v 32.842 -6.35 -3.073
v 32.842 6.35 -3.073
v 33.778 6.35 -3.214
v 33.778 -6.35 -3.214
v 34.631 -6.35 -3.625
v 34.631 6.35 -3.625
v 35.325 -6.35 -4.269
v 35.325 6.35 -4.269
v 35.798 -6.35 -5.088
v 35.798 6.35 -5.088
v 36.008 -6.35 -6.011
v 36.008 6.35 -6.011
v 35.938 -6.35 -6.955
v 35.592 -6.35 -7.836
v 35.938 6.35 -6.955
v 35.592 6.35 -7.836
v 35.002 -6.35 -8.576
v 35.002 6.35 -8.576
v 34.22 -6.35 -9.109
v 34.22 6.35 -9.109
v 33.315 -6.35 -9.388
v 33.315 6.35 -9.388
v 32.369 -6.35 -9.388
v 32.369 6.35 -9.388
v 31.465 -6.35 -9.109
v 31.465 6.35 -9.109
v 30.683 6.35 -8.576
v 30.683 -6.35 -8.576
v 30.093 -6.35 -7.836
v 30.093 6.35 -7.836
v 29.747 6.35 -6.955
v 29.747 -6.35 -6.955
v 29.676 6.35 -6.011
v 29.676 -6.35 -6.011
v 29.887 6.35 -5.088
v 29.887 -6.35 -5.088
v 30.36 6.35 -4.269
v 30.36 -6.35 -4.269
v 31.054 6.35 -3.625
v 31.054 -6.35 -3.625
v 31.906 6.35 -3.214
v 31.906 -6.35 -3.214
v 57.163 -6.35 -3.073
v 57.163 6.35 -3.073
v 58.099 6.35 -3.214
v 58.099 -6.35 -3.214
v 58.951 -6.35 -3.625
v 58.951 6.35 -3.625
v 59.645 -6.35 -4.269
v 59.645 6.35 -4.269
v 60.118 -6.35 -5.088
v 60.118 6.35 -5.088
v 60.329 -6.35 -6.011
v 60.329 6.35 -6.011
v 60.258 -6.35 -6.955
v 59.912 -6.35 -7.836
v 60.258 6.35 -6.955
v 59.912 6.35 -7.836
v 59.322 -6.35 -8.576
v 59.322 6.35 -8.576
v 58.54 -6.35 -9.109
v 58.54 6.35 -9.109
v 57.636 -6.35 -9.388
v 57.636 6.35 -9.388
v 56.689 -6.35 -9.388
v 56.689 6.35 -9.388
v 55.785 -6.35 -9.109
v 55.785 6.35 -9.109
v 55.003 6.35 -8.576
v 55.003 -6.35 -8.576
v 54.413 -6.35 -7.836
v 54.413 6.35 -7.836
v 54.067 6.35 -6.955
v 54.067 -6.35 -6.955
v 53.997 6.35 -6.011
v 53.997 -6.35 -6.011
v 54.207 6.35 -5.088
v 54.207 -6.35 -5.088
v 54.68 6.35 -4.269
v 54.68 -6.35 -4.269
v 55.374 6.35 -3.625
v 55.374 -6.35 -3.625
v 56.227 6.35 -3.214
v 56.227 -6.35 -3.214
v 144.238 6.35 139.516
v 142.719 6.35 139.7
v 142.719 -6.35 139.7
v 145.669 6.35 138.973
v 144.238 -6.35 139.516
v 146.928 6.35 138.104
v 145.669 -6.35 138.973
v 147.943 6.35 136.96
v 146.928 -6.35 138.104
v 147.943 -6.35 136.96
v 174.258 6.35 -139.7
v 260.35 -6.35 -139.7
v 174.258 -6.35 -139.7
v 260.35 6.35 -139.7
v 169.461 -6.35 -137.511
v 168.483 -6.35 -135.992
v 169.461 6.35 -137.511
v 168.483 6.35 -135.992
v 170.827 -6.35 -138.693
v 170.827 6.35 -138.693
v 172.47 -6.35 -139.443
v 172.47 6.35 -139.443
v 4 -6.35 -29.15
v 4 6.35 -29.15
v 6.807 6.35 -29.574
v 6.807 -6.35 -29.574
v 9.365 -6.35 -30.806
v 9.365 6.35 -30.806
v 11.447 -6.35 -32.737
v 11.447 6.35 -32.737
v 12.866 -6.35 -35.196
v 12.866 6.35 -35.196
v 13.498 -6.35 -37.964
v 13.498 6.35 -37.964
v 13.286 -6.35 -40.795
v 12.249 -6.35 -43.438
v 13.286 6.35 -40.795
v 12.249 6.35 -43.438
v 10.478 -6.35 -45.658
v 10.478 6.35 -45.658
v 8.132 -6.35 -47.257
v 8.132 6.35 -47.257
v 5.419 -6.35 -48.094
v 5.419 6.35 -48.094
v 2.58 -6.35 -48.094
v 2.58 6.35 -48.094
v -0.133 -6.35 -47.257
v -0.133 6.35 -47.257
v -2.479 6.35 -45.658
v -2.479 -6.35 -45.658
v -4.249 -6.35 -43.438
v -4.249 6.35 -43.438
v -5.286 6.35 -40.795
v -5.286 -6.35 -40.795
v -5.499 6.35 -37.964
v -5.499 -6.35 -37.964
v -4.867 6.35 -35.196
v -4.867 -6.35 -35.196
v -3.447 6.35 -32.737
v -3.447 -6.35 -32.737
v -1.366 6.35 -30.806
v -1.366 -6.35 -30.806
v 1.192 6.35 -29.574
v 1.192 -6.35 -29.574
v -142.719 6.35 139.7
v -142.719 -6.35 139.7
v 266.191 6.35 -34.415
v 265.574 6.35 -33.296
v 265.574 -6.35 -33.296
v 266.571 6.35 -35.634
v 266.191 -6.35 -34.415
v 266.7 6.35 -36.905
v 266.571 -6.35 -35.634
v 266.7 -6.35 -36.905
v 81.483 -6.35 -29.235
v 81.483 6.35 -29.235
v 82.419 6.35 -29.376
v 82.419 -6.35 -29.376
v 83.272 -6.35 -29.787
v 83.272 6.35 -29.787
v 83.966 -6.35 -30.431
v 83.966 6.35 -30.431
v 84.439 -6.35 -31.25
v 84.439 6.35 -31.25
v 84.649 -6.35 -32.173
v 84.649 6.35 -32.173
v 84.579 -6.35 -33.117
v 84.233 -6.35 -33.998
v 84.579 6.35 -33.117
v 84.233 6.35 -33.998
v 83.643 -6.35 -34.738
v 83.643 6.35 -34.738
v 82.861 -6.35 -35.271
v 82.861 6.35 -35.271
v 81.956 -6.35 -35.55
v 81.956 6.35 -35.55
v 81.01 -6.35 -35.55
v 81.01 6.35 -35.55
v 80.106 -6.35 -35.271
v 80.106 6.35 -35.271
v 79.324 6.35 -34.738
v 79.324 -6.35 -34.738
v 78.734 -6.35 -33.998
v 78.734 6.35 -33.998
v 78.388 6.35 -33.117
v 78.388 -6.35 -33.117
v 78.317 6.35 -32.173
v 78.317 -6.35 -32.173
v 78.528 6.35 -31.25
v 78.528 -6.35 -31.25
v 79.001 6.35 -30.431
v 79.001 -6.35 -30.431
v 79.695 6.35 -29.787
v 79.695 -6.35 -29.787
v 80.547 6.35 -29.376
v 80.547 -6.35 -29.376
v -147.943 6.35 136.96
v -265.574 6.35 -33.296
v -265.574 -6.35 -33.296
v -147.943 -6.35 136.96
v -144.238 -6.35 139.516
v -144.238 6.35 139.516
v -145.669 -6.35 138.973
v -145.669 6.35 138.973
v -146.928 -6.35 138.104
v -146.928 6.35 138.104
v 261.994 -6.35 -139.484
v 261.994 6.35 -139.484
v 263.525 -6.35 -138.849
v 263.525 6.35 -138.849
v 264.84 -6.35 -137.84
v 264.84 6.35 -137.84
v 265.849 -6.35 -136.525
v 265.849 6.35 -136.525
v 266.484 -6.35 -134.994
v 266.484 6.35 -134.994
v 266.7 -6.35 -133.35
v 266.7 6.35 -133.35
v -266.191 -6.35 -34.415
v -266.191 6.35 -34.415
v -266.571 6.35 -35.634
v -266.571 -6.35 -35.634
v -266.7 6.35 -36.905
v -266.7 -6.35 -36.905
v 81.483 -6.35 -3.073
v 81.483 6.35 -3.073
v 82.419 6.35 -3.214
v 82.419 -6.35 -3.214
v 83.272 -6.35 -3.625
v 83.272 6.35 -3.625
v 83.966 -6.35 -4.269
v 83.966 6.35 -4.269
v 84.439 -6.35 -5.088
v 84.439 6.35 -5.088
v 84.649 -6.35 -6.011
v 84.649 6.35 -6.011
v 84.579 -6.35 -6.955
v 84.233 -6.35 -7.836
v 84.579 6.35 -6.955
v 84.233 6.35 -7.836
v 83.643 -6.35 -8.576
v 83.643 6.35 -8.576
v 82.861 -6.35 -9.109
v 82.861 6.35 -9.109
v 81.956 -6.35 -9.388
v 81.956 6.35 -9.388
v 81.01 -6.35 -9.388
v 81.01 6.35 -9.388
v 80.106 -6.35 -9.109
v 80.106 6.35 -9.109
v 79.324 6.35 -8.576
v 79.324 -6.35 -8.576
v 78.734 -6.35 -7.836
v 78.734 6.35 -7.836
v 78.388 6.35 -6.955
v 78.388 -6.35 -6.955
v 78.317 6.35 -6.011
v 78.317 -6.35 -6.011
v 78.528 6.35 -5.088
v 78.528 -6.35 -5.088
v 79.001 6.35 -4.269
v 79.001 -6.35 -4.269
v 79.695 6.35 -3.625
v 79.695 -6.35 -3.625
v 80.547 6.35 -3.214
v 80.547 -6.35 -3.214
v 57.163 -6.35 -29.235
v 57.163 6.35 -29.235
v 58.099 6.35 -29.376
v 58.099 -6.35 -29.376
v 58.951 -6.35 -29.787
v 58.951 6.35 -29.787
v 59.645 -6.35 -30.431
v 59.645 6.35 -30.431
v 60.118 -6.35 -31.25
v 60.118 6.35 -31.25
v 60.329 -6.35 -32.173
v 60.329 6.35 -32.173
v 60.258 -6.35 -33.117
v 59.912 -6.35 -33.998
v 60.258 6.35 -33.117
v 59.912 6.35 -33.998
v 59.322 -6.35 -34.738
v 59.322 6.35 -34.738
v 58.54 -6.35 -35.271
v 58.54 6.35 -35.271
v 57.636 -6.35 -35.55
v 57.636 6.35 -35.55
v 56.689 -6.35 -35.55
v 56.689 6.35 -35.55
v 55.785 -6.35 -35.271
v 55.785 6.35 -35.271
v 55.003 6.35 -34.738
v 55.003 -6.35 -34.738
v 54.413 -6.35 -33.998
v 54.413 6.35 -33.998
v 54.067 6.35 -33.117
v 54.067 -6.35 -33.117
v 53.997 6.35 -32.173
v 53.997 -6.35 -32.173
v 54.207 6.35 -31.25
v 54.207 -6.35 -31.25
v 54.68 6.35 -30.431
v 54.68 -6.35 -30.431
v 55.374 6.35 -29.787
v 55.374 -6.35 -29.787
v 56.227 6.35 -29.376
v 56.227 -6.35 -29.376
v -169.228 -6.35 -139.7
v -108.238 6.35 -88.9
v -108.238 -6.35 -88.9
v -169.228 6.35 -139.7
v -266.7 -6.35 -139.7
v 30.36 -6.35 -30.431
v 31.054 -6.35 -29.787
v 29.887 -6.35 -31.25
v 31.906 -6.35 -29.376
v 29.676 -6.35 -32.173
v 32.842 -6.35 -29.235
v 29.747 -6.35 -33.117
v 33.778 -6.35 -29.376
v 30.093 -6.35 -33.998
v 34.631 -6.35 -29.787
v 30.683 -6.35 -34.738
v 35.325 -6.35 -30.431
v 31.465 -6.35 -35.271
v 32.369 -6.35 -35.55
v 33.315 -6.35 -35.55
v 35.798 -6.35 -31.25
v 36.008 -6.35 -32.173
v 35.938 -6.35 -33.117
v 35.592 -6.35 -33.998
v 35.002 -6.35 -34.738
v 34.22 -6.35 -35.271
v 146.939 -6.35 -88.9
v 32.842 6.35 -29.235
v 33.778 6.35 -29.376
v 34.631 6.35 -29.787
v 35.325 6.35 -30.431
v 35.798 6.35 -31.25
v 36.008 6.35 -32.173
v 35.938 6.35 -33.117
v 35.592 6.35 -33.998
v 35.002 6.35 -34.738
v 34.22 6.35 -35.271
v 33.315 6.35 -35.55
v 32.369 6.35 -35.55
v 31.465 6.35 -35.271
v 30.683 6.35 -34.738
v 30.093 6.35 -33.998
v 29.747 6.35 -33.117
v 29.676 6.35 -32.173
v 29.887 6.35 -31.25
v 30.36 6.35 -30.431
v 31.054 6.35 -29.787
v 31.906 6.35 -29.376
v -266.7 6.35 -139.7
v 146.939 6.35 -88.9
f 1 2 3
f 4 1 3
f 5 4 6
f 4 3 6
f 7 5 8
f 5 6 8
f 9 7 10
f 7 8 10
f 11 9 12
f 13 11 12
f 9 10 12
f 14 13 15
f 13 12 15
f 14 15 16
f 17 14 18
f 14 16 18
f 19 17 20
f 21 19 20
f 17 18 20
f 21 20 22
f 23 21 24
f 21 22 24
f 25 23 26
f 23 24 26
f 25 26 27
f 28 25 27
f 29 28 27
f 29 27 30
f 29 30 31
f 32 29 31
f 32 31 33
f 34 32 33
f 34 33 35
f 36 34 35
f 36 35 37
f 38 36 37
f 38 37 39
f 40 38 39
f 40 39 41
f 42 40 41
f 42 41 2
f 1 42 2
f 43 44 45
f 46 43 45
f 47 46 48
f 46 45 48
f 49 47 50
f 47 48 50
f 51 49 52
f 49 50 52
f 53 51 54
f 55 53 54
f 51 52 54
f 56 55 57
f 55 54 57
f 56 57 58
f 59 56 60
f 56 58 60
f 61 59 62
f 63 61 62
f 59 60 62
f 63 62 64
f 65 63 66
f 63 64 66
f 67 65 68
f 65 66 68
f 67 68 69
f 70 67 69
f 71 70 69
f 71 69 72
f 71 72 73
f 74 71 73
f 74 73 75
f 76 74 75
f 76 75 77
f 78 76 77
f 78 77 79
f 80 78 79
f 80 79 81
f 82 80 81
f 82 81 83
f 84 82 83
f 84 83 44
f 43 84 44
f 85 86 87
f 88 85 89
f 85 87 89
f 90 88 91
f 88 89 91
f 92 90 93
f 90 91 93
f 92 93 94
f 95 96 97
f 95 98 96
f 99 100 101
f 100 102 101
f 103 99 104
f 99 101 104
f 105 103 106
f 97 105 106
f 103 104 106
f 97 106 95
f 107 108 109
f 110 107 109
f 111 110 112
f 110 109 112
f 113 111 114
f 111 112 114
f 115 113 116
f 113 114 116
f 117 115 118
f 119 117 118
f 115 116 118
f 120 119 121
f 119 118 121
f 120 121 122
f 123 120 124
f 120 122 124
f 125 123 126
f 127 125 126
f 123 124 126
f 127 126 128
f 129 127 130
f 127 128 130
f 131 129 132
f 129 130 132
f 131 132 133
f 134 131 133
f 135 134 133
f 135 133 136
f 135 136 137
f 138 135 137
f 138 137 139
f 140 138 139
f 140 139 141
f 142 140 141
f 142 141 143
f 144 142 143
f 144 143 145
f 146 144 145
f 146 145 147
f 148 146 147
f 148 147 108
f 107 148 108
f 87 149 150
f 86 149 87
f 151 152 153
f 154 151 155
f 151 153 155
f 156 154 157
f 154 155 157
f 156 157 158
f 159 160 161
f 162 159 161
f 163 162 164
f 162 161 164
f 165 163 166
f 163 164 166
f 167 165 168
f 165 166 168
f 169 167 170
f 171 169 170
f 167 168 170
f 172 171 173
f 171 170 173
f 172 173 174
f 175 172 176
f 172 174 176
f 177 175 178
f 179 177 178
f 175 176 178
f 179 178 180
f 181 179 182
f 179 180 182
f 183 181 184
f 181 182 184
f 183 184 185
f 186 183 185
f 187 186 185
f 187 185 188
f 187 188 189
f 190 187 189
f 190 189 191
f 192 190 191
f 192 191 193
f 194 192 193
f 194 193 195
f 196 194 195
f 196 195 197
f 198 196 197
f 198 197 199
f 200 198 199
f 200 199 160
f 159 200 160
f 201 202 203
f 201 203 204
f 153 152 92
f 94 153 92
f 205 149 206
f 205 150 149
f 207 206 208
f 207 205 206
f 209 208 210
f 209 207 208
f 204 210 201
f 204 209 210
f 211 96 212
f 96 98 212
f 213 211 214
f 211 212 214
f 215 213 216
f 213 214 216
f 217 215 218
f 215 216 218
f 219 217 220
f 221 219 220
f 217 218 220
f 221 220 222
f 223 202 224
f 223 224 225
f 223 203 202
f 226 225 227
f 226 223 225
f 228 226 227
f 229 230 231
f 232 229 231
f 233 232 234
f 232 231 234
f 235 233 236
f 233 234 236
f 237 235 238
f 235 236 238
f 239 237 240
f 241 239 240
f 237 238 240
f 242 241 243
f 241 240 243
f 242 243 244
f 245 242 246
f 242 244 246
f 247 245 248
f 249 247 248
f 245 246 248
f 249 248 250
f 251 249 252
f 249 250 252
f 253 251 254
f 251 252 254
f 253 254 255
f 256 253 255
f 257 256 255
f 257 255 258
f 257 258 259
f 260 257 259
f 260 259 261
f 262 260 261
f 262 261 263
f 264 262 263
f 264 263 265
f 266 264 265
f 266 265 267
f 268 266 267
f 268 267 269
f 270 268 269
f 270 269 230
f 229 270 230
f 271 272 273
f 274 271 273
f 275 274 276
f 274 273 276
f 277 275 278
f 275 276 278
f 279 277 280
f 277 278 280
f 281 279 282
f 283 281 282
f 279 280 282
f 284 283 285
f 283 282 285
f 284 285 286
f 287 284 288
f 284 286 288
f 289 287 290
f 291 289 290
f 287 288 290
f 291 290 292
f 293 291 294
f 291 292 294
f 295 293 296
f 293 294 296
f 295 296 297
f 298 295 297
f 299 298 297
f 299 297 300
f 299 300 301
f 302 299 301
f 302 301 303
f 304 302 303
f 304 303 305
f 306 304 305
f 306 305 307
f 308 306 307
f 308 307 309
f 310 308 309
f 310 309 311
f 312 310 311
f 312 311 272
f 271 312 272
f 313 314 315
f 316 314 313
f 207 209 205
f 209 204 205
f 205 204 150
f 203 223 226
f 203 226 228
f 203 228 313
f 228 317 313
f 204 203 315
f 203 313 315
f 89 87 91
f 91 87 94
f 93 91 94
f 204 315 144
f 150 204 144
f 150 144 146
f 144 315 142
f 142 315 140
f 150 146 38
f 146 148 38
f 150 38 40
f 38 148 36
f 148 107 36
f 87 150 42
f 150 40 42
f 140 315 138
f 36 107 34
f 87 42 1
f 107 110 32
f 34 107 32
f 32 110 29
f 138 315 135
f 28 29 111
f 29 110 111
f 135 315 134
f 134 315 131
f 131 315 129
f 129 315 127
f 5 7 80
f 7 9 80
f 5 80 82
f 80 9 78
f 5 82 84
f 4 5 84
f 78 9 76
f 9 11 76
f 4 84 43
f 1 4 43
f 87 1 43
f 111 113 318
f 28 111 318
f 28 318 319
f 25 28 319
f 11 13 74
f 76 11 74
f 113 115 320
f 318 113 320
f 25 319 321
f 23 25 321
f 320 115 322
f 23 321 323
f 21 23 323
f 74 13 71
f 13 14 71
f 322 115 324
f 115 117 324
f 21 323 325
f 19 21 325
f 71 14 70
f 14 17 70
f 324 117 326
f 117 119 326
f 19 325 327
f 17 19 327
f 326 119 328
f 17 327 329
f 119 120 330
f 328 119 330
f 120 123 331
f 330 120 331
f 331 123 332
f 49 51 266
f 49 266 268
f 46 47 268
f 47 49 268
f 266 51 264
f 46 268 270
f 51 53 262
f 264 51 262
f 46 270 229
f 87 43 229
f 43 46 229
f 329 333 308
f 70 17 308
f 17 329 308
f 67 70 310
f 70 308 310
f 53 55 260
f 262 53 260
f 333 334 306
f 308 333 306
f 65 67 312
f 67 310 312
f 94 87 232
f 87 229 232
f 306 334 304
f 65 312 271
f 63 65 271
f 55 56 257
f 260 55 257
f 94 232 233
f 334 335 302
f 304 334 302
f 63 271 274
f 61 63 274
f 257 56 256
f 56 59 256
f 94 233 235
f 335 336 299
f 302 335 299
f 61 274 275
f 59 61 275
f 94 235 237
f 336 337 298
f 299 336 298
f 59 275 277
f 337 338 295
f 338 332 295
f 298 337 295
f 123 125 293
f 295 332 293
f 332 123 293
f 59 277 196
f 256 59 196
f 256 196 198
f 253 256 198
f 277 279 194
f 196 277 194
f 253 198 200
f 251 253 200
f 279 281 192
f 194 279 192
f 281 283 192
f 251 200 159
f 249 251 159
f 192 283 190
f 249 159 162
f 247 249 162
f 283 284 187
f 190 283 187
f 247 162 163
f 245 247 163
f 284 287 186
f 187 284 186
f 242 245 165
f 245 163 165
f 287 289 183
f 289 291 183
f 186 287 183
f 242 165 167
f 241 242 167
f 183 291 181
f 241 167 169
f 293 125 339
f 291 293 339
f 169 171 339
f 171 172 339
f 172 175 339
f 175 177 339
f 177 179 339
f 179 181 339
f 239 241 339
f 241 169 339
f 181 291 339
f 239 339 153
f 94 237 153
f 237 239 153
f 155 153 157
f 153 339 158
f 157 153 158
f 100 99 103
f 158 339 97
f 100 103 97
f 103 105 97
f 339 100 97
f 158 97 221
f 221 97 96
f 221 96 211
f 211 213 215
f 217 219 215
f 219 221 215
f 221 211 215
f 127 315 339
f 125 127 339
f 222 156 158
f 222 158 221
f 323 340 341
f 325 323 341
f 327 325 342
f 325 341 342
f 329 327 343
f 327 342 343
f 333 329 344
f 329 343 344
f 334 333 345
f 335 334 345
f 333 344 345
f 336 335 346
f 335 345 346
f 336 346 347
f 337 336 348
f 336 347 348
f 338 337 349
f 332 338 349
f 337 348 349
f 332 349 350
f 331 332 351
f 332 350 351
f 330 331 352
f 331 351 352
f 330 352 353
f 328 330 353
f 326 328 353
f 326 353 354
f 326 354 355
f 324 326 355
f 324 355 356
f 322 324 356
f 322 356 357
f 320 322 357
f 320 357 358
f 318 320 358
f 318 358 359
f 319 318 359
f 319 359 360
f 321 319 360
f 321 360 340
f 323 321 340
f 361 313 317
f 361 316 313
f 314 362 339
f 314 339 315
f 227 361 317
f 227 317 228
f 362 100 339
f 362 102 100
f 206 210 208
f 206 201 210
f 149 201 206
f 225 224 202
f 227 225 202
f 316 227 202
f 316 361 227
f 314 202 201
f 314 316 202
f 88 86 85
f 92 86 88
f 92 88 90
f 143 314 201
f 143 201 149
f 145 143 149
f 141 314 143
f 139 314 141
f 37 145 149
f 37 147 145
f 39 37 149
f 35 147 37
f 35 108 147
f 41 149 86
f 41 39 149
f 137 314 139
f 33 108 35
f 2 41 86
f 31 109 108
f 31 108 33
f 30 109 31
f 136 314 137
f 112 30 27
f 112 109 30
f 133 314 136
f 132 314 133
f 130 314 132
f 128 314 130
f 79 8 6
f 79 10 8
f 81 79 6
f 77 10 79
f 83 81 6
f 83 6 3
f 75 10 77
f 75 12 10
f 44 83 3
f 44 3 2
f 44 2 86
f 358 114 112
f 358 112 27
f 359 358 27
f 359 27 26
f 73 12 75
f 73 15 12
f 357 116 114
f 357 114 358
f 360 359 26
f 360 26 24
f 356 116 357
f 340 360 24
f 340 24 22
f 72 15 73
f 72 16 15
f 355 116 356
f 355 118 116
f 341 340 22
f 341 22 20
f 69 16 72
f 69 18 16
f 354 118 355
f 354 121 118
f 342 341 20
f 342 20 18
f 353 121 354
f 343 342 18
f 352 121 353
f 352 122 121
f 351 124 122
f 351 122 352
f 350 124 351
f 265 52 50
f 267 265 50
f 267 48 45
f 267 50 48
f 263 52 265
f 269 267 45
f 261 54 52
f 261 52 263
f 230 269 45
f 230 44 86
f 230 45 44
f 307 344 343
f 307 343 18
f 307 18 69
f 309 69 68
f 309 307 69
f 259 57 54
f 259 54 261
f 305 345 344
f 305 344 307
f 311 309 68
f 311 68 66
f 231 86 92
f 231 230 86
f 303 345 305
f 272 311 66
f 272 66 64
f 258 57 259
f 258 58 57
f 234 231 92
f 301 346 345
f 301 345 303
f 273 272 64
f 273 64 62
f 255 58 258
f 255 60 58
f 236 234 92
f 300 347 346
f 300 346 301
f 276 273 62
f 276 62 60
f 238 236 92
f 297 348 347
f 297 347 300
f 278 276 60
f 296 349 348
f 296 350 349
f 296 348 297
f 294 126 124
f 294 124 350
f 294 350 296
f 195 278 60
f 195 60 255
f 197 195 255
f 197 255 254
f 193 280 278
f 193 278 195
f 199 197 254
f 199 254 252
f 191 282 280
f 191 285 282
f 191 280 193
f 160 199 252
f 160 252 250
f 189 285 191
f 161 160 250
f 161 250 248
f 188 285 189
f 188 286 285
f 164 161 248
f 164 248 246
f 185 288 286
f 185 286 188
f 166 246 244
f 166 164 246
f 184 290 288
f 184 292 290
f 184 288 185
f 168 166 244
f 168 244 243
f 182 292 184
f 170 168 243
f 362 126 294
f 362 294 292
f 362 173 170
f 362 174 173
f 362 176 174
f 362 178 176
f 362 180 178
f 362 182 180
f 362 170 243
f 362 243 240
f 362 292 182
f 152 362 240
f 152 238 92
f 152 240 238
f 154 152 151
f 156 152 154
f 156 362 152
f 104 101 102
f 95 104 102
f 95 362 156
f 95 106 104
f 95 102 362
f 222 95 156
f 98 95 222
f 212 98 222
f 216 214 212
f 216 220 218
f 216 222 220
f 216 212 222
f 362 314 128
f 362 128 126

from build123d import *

# Parameters (mm, degrees)
BOSS_EXTRUDE1_DEPTH = 6.35
SKETCH2_R           = 3.175
CUT_EXTRUDE1_DEPTH  = 302.34078715
CUT_EXTRUDE2_DEPTH  = 302.34078715
FILLET1_R           = 6.35
SKETCH4_R           = 9.525
CUT_EXTRUDE3_DEPTH  = 302.34078715


with BuildPart() as part:
    # Sketch1 → Boss-Extrude1 (new, symmetric)
    with BuildSketch(Plane(origin=(0, 0, 0), x_dir=(1, 0, 0), z_dir=(0, 1, 0))):
        Polygon((-266.7, -139.7), (266.7, -139.7), (266.7, 139.7), (170.18, 139.7), (146.939, 88.9), (-108.237741638, 88.9), (-169.2275, 139.7), (-266.7, 139.7), align=None)
    extrude(amount=BOSS_EXTRUDE1_DEPTH, both=True)

    # Sketch2 → Cut-Extrude1 (cut, through all)
    with BuildSketch(Plane(origin=(0, 6.35, 0), x_dir=(1, 0, 0), z_dir=(0, 1, 0))):
        with Locations(Location((81.4832, 6.2484, 0), (0, 0, 270))):
            Circle(SKETCH2_R)
        with Locations(Location((81.4832, 32.4104, 0), (0, 0, 270))):
            Circle(SKETCH2_R)
        with Locations(Location((57.1627, 32.4104, 0), (0, 0, 270))):
            Circle(SKETCH2_R)
        with Locations(Location((32.8422, 32.4104, 0), (0, 0, 270))):
            Circle(SKETCH2_R)
        with Locations(Location((32.8422, 6.2484, 0), (0, 0, 270))):
            Circle(SKETCH2_R)
        with Locations(Location((57.1627, 6.2484, 0), (0, 0, 270))):
            Circle(SKETCH2_R)
    extrude(amount=-CUT_EXTRUDE1_DEPTH, mode=Mode.SUBTRACT)

    # Sketch3 → Cut-Extrude2 (cut, through all)
    with BuildSketch(Plane(origin=(0, 6.35, 0), x_dir=(1, 0, 0), z_dir=(0, 1, 0))):
        Polygon((-266.7, 34.925), (-146.05, -139.7), (-266.7, -139.7), align=None)
    cut_extrude2 = extrude(amount=-CUT_EXTRUDE2_DEPTH, mode=Mode.SUBTRACT)

    # Mirror1: Cut-Extrude2 across plane
    add(cut_extrude2.mirror(Plane(origin=(0, 0, 0), x_dir=(0, 0, 1), z_dir=(1, 0, 0))), mode=Mode.SUBTRACT)

    # Fillet1
    fillet1_edges = [part.edges().sort_by_distance(p)[0] for p in [
        (170.18, 0, -139.7),
        (266.7, 0, -139.7),
        (-266.7, 0, -34.925),
        (-146.05, 0, 139.7),
        (266.7, 0, -34.925),
        (146.05, 0, 139.7),
    ]]
    fillet(fillet1_edges, radius=FILLET1_R)

    # Sketch4 → Cut-Extrude3 (cut, through all)
    with BuildSketch(Plane(origin=(0, 6.35, 0), x_dir=(1, 0, 0), z_dir=(0, 1, 0))):
        with Locations(Location((3.99970692, 38.675446652, 0), (0, 0, 270))):
            Circle(SKETCH4_R)
    extrude(amount=-CUT_EXTRUDE3_DEPTH, mode=Mode.SUBTRACT)


solid = part.part
